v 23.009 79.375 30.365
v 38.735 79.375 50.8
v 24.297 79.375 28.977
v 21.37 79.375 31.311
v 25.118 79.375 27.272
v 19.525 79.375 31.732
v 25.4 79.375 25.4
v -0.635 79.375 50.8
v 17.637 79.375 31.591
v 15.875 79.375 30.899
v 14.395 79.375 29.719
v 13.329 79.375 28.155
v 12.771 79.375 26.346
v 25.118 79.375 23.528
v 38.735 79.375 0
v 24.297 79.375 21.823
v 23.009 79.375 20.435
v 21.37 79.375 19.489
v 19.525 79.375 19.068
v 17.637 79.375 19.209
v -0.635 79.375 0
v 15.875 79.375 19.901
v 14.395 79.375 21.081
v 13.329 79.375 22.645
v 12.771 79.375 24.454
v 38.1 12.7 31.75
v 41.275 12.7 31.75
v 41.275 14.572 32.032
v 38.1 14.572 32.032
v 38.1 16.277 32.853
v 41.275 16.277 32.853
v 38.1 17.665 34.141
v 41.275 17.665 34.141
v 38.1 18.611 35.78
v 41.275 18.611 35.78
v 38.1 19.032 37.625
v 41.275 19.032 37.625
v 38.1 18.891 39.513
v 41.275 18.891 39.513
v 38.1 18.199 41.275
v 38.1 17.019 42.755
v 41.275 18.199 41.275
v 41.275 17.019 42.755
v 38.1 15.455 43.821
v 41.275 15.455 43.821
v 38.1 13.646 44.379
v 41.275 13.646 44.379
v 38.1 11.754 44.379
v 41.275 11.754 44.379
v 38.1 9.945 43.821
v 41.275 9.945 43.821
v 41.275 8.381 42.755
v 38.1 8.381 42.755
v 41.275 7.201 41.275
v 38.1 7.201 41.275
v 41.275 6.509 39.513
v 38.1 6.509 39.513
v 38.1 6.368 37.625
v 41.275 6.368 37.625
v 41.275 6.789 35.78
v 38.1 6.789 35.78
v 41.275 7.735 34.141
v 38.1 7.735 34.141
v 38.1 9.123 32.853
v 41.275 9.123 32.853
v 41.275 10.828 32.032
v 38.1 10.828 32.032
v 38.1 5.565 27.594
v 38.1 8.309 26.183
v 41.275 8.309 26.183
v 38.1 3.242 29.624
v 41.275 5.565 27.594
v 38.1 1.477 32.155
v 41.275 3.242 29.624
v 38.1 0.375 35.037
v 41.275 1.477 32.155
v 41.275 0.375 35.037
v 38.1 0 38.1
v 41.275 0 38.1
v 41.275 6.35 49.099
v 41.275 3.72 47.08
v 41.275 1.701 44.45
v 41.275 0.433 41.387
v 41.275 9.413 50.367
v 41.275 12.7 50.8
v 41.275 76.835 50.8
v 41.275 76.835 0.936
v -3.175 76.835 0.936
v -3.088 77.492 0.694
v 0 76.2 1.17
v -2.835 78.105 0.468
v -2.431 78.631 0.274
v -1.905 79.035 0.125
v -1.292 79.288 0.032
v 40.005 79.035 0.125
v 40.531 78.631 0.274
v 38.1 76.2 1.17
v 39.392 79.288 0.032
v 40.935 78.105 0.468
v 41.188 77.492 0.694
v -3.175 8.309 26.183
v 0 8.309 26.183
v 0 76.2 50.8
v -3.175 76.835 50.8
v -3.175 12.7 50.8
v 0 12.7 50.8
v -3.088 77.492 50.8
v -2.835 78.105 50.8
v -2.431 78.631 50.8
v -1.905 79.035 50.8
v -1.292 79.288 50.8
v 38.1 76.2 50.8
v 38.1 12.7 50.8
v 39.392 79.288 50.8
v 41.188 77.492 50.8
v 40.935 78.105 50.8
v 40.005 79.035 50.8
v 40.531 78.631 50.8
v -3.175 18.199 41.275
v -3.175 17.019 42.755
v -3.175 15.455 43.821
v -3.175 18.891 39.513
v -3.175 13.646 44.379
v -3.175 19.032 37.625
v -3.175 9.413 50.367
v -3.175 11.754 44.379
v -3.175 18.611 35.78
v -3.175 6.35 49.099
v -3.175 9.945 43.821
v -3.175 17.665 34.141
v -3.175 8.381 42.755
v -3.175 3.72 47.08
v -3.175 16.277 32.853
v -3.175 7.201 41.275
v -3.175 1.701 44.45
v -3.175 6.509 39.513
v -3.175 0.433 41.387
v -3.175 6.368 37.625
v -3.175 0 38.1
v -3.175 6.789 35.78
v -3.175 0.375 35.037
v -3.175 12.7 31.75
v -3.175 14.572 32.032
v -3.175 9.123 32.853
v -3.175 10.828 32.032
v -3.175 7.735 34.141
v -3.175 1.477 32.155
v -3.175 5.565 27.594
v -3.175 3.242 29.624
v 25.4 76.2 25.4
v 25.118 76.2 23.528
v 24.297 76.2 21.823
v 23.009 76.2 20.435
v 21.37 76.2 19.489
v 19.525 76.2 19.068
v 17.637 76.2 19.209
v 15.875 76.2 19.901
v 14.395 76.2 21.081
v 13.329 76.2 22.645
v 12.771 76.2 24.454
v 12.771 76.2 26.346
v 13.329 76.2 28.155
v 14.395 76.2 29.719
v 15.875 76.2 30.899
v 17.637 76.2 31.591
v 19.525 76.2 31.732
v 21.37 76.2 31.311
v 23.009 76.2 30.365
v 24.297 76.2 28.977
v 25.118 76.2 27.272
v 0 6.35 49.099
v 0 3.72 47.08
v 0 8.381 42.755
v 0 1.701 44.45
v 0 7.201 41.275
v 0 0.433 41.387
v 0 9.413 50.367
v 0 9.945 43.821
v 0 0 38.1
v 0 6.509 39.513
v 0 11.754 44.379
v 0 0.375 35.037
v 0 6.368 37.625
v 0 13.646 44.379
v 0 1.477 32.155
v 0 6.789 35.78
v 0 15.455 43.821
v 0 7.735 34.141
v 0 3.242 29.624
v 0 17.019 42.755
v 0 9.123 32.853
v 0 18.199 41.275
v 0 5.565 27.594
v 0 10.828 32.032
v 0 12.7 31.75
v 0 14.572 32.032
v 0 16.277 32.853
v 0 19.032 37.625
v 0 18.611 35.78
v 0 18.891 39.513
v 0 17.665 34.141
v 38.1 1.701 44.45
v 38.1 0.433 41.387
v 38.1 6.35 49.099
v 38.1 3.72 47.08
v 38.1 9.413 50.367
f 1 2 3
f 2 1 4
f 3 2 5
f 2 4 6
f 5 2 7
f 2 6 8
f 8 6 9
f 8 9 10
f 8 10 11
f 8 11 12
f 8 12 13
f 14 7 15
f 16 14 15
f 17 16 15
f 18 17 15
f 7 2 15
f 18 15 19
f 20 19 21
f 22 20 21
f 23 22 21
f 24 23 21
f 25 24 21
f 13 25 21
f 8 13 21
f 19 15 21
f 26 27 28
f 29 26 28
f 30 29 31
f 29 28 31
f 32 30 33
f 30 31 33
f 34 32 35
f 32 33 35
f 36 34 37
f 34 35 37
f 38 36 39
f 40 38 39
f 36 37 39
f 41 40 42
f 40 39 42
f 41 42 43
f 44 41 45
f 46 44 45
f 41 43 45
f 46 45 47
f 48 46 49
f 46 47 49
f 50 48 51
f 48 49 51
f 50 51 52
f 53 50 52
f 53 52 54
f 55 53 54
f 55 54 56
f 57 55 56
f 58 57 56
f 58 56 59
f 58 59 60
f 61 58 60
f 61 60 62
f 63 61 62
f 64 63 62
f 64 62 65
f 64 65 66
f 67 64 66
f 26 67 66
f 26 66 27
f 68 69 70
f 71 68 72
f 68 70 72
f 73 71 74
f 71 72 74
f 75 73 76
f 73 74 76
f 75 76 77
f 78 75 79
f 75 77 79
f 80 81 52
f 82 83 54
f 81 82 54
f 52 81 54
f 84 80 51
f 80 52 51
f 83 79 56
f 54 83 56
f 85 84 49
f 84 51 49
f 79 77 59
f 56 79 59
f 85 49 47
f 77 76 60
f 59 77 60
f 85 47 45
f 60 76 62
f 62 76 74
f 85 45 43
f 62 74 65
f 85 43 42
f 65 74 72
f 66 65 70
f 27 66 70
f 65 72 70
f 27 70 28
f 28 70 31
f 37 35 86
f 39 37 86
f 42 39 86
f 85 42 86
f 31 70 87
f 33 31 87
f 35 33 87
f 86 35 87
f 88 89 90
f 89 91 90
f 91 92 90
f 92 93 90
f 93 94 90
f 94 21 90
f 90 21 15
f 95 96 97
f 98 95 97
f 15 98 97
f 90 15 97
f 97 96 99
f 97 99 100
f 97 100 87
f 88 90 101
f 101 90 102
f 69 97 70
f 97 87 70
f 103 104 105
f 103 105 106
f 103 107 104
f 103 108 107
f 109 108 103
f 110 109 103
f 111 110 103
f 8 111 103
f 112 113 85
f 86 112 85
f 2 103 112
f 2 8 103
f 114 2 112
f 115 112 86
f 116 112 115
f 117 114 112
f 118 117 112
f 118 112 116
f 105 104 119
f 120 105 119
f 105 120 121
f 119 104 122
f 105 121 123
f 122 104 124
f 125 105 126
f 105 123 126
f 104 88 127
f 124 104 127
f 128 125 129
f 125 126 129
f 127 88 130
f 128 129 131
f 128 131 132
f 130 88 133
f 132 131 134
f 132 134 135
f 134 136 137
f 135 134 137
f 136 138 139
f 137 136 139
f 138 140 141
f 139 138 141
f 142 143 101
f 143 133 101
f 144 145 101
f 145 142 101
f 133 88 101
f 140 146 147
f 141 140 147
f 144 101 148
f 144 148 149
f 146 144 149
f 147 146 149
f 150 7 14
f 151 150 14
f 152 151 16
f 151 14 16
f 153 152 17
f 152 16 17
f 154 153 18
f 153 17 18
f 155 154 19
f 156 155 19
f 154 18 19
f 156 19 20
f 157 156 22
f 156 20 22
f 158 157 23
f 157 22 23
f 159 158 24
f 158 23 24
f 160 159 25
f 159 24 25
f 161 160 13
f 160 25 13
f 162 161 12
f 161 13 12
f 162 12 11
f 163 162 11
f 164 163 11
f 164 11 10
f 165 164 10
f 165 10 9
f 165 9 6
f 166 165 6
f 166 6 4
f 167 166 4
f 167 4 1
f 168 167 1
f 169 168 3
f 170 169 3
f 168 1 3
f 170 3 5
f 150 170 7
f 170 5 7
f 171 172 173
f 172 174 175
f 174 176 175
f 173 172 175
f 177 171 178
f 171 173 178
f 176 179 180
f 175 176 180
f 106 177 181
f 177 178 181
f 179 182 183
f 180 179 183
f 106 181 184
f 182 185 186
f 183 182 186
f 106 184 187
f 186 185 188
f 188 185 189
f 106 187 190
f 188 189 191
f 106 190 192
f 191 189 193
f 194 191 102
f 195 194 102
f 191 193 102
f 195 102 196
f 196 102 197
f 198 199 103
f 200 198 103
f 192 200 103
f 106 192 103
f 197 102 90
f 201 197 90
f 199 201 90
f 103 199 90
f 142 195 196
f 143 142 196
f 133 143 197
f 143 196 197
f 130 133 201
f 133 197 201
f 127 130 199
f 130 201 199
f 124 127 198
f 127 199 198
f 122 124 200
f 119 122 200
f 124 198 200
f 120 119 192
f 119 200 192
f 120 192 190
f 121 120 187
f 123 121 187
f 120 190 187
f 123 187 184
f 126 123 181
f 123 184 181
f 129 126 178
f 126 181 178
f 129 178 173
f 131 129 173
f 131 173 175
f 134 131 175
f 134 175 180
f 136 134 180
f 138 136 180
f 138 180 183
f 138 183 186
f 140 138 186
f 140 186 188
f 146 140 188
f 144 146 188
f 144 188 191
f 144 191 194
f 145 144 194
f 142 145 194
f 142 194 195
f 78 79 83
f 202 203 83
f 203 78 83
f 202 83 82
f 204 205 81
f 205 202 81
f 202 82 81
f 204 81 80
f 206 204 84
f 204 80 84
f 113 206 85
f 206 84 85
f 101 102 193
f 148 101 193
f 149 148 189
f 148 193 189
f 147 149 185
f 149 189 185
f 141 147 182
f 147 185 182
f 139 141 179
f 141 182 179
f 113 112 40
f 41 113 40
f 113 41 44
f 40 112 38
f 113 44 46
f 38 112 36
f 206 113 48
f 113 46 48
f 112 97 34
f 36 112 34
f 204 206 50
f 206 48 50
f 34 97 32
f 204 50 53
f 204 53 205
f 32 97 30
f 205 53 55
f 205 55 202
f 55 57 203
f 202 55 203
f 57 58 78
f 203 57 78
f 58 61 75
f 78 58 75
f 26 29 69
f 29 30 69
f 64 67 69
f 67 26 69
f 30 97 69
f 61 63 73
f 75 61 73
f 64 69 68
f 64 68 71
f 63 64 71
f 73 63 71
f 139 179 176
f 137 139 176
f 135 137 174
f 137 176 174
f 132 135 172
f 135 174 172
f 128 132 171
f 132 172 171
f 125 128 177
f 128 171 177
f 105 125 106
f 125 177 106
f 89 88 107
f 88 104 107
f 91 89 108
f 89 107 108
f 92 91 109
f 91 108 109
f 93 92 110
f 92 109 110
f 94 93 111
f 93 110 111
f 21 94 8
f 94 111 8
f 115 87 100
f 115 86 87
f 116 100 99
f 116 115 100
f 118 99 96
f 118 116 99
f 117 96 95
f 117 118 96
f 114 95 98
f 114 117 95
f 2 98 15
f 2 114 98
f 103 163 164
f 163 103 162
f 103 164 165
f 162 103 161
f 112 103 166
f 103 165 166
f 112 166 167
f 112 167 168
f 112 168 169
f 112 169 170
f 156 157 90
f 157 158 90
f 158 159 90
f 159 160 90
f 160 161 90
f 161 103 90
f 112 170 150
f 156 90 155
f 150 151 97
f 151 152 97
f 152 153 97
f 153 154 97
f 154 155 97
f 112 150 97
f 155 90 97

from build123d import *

# Parameters (mm, degrees)
SALIENTE_EXTRUIR1_DEPTH = 50.8
CROQUIS4_R              = 6.35
CORTAR_EXTRUIR4_DEPTH   = 50.8
REDONDEO1_R             = 2.54
CROQUIS7_R              = 6.35
CORTAR_EXTRUIR5_DEPTH   = 3.175


with BuildPart() as part:
    # Croquis3 → Saliente-Extruir1 (new body)
    with BuildSketch(Plane.XY):
        Polygon((0, 0), (0, 76.2), (38.1, 76.2), (38.1, 0), (41.275, 0), (41.275, 79.375), (-3.175, 79.375), (-3.175, 0), align=None)
    extrude(amount=SALIENTE_EXTRUIR1_DEPTH)

    # Croquis4 → Cortar-Extruir4 (cut)
    with BuildSketch(Plane(origin=(41.275, 0, 0), x_dir=(0, 0, -1), z_dir=(1, 0, 0))):
        with BuildLine():
            Line((-50.8, 0), (-38.099999933, 0))
            ThreePointArc((-38.099999933, 0), (-47.080256097, 3.719743855), (-50.8, 12.7))
            Line((-50.8, 12.7), (-50.8, 0))
        make_face()
        with Locations((-38.1, 12.7)):
            Circle(CROQUIS4_R)
        with BuildLine():
            Line((0, 0), (0, 79.375))
            Line((0, 79.375), (-26.18309853, 8.309389636))
            ThreePointArc((-26.18309853, 8.309389636), (-30.836073748, 2.282448685), (-38.099999933, 0))
            Line((-38.099999933, 0), (0, 0))
        make_face()
    extrude(amount=-CORTAR_EXTRUIR4_DEPTH, mode=Mode.SUBTRACT)

    # Redondeo1
    redondeo1_edges = [part.edges().sort_by_distance(p)[0] for p in [
        (-3.175, 79.375, 25.4),
        (41.275, 79.375, 25.4),
    ]]
    fillet(redondeo1_edges, radius=REDONDEO1_R)

    # Croquis7 → Cortar-Extruir5 (cut)
    with BuildSketch(Plane(origin=(0, 79.375, 0), x_dir=(1, 0, 0), z_dir=(0, 1, 0))):
        with Locations((19.05, -25.4)):
            Circle(CROQUIS7_R)
    extrude(amount=-CORTAR_EXTRUIR5_DEPTH, mode=Mode.SUBTRACT)


solid = part.part
